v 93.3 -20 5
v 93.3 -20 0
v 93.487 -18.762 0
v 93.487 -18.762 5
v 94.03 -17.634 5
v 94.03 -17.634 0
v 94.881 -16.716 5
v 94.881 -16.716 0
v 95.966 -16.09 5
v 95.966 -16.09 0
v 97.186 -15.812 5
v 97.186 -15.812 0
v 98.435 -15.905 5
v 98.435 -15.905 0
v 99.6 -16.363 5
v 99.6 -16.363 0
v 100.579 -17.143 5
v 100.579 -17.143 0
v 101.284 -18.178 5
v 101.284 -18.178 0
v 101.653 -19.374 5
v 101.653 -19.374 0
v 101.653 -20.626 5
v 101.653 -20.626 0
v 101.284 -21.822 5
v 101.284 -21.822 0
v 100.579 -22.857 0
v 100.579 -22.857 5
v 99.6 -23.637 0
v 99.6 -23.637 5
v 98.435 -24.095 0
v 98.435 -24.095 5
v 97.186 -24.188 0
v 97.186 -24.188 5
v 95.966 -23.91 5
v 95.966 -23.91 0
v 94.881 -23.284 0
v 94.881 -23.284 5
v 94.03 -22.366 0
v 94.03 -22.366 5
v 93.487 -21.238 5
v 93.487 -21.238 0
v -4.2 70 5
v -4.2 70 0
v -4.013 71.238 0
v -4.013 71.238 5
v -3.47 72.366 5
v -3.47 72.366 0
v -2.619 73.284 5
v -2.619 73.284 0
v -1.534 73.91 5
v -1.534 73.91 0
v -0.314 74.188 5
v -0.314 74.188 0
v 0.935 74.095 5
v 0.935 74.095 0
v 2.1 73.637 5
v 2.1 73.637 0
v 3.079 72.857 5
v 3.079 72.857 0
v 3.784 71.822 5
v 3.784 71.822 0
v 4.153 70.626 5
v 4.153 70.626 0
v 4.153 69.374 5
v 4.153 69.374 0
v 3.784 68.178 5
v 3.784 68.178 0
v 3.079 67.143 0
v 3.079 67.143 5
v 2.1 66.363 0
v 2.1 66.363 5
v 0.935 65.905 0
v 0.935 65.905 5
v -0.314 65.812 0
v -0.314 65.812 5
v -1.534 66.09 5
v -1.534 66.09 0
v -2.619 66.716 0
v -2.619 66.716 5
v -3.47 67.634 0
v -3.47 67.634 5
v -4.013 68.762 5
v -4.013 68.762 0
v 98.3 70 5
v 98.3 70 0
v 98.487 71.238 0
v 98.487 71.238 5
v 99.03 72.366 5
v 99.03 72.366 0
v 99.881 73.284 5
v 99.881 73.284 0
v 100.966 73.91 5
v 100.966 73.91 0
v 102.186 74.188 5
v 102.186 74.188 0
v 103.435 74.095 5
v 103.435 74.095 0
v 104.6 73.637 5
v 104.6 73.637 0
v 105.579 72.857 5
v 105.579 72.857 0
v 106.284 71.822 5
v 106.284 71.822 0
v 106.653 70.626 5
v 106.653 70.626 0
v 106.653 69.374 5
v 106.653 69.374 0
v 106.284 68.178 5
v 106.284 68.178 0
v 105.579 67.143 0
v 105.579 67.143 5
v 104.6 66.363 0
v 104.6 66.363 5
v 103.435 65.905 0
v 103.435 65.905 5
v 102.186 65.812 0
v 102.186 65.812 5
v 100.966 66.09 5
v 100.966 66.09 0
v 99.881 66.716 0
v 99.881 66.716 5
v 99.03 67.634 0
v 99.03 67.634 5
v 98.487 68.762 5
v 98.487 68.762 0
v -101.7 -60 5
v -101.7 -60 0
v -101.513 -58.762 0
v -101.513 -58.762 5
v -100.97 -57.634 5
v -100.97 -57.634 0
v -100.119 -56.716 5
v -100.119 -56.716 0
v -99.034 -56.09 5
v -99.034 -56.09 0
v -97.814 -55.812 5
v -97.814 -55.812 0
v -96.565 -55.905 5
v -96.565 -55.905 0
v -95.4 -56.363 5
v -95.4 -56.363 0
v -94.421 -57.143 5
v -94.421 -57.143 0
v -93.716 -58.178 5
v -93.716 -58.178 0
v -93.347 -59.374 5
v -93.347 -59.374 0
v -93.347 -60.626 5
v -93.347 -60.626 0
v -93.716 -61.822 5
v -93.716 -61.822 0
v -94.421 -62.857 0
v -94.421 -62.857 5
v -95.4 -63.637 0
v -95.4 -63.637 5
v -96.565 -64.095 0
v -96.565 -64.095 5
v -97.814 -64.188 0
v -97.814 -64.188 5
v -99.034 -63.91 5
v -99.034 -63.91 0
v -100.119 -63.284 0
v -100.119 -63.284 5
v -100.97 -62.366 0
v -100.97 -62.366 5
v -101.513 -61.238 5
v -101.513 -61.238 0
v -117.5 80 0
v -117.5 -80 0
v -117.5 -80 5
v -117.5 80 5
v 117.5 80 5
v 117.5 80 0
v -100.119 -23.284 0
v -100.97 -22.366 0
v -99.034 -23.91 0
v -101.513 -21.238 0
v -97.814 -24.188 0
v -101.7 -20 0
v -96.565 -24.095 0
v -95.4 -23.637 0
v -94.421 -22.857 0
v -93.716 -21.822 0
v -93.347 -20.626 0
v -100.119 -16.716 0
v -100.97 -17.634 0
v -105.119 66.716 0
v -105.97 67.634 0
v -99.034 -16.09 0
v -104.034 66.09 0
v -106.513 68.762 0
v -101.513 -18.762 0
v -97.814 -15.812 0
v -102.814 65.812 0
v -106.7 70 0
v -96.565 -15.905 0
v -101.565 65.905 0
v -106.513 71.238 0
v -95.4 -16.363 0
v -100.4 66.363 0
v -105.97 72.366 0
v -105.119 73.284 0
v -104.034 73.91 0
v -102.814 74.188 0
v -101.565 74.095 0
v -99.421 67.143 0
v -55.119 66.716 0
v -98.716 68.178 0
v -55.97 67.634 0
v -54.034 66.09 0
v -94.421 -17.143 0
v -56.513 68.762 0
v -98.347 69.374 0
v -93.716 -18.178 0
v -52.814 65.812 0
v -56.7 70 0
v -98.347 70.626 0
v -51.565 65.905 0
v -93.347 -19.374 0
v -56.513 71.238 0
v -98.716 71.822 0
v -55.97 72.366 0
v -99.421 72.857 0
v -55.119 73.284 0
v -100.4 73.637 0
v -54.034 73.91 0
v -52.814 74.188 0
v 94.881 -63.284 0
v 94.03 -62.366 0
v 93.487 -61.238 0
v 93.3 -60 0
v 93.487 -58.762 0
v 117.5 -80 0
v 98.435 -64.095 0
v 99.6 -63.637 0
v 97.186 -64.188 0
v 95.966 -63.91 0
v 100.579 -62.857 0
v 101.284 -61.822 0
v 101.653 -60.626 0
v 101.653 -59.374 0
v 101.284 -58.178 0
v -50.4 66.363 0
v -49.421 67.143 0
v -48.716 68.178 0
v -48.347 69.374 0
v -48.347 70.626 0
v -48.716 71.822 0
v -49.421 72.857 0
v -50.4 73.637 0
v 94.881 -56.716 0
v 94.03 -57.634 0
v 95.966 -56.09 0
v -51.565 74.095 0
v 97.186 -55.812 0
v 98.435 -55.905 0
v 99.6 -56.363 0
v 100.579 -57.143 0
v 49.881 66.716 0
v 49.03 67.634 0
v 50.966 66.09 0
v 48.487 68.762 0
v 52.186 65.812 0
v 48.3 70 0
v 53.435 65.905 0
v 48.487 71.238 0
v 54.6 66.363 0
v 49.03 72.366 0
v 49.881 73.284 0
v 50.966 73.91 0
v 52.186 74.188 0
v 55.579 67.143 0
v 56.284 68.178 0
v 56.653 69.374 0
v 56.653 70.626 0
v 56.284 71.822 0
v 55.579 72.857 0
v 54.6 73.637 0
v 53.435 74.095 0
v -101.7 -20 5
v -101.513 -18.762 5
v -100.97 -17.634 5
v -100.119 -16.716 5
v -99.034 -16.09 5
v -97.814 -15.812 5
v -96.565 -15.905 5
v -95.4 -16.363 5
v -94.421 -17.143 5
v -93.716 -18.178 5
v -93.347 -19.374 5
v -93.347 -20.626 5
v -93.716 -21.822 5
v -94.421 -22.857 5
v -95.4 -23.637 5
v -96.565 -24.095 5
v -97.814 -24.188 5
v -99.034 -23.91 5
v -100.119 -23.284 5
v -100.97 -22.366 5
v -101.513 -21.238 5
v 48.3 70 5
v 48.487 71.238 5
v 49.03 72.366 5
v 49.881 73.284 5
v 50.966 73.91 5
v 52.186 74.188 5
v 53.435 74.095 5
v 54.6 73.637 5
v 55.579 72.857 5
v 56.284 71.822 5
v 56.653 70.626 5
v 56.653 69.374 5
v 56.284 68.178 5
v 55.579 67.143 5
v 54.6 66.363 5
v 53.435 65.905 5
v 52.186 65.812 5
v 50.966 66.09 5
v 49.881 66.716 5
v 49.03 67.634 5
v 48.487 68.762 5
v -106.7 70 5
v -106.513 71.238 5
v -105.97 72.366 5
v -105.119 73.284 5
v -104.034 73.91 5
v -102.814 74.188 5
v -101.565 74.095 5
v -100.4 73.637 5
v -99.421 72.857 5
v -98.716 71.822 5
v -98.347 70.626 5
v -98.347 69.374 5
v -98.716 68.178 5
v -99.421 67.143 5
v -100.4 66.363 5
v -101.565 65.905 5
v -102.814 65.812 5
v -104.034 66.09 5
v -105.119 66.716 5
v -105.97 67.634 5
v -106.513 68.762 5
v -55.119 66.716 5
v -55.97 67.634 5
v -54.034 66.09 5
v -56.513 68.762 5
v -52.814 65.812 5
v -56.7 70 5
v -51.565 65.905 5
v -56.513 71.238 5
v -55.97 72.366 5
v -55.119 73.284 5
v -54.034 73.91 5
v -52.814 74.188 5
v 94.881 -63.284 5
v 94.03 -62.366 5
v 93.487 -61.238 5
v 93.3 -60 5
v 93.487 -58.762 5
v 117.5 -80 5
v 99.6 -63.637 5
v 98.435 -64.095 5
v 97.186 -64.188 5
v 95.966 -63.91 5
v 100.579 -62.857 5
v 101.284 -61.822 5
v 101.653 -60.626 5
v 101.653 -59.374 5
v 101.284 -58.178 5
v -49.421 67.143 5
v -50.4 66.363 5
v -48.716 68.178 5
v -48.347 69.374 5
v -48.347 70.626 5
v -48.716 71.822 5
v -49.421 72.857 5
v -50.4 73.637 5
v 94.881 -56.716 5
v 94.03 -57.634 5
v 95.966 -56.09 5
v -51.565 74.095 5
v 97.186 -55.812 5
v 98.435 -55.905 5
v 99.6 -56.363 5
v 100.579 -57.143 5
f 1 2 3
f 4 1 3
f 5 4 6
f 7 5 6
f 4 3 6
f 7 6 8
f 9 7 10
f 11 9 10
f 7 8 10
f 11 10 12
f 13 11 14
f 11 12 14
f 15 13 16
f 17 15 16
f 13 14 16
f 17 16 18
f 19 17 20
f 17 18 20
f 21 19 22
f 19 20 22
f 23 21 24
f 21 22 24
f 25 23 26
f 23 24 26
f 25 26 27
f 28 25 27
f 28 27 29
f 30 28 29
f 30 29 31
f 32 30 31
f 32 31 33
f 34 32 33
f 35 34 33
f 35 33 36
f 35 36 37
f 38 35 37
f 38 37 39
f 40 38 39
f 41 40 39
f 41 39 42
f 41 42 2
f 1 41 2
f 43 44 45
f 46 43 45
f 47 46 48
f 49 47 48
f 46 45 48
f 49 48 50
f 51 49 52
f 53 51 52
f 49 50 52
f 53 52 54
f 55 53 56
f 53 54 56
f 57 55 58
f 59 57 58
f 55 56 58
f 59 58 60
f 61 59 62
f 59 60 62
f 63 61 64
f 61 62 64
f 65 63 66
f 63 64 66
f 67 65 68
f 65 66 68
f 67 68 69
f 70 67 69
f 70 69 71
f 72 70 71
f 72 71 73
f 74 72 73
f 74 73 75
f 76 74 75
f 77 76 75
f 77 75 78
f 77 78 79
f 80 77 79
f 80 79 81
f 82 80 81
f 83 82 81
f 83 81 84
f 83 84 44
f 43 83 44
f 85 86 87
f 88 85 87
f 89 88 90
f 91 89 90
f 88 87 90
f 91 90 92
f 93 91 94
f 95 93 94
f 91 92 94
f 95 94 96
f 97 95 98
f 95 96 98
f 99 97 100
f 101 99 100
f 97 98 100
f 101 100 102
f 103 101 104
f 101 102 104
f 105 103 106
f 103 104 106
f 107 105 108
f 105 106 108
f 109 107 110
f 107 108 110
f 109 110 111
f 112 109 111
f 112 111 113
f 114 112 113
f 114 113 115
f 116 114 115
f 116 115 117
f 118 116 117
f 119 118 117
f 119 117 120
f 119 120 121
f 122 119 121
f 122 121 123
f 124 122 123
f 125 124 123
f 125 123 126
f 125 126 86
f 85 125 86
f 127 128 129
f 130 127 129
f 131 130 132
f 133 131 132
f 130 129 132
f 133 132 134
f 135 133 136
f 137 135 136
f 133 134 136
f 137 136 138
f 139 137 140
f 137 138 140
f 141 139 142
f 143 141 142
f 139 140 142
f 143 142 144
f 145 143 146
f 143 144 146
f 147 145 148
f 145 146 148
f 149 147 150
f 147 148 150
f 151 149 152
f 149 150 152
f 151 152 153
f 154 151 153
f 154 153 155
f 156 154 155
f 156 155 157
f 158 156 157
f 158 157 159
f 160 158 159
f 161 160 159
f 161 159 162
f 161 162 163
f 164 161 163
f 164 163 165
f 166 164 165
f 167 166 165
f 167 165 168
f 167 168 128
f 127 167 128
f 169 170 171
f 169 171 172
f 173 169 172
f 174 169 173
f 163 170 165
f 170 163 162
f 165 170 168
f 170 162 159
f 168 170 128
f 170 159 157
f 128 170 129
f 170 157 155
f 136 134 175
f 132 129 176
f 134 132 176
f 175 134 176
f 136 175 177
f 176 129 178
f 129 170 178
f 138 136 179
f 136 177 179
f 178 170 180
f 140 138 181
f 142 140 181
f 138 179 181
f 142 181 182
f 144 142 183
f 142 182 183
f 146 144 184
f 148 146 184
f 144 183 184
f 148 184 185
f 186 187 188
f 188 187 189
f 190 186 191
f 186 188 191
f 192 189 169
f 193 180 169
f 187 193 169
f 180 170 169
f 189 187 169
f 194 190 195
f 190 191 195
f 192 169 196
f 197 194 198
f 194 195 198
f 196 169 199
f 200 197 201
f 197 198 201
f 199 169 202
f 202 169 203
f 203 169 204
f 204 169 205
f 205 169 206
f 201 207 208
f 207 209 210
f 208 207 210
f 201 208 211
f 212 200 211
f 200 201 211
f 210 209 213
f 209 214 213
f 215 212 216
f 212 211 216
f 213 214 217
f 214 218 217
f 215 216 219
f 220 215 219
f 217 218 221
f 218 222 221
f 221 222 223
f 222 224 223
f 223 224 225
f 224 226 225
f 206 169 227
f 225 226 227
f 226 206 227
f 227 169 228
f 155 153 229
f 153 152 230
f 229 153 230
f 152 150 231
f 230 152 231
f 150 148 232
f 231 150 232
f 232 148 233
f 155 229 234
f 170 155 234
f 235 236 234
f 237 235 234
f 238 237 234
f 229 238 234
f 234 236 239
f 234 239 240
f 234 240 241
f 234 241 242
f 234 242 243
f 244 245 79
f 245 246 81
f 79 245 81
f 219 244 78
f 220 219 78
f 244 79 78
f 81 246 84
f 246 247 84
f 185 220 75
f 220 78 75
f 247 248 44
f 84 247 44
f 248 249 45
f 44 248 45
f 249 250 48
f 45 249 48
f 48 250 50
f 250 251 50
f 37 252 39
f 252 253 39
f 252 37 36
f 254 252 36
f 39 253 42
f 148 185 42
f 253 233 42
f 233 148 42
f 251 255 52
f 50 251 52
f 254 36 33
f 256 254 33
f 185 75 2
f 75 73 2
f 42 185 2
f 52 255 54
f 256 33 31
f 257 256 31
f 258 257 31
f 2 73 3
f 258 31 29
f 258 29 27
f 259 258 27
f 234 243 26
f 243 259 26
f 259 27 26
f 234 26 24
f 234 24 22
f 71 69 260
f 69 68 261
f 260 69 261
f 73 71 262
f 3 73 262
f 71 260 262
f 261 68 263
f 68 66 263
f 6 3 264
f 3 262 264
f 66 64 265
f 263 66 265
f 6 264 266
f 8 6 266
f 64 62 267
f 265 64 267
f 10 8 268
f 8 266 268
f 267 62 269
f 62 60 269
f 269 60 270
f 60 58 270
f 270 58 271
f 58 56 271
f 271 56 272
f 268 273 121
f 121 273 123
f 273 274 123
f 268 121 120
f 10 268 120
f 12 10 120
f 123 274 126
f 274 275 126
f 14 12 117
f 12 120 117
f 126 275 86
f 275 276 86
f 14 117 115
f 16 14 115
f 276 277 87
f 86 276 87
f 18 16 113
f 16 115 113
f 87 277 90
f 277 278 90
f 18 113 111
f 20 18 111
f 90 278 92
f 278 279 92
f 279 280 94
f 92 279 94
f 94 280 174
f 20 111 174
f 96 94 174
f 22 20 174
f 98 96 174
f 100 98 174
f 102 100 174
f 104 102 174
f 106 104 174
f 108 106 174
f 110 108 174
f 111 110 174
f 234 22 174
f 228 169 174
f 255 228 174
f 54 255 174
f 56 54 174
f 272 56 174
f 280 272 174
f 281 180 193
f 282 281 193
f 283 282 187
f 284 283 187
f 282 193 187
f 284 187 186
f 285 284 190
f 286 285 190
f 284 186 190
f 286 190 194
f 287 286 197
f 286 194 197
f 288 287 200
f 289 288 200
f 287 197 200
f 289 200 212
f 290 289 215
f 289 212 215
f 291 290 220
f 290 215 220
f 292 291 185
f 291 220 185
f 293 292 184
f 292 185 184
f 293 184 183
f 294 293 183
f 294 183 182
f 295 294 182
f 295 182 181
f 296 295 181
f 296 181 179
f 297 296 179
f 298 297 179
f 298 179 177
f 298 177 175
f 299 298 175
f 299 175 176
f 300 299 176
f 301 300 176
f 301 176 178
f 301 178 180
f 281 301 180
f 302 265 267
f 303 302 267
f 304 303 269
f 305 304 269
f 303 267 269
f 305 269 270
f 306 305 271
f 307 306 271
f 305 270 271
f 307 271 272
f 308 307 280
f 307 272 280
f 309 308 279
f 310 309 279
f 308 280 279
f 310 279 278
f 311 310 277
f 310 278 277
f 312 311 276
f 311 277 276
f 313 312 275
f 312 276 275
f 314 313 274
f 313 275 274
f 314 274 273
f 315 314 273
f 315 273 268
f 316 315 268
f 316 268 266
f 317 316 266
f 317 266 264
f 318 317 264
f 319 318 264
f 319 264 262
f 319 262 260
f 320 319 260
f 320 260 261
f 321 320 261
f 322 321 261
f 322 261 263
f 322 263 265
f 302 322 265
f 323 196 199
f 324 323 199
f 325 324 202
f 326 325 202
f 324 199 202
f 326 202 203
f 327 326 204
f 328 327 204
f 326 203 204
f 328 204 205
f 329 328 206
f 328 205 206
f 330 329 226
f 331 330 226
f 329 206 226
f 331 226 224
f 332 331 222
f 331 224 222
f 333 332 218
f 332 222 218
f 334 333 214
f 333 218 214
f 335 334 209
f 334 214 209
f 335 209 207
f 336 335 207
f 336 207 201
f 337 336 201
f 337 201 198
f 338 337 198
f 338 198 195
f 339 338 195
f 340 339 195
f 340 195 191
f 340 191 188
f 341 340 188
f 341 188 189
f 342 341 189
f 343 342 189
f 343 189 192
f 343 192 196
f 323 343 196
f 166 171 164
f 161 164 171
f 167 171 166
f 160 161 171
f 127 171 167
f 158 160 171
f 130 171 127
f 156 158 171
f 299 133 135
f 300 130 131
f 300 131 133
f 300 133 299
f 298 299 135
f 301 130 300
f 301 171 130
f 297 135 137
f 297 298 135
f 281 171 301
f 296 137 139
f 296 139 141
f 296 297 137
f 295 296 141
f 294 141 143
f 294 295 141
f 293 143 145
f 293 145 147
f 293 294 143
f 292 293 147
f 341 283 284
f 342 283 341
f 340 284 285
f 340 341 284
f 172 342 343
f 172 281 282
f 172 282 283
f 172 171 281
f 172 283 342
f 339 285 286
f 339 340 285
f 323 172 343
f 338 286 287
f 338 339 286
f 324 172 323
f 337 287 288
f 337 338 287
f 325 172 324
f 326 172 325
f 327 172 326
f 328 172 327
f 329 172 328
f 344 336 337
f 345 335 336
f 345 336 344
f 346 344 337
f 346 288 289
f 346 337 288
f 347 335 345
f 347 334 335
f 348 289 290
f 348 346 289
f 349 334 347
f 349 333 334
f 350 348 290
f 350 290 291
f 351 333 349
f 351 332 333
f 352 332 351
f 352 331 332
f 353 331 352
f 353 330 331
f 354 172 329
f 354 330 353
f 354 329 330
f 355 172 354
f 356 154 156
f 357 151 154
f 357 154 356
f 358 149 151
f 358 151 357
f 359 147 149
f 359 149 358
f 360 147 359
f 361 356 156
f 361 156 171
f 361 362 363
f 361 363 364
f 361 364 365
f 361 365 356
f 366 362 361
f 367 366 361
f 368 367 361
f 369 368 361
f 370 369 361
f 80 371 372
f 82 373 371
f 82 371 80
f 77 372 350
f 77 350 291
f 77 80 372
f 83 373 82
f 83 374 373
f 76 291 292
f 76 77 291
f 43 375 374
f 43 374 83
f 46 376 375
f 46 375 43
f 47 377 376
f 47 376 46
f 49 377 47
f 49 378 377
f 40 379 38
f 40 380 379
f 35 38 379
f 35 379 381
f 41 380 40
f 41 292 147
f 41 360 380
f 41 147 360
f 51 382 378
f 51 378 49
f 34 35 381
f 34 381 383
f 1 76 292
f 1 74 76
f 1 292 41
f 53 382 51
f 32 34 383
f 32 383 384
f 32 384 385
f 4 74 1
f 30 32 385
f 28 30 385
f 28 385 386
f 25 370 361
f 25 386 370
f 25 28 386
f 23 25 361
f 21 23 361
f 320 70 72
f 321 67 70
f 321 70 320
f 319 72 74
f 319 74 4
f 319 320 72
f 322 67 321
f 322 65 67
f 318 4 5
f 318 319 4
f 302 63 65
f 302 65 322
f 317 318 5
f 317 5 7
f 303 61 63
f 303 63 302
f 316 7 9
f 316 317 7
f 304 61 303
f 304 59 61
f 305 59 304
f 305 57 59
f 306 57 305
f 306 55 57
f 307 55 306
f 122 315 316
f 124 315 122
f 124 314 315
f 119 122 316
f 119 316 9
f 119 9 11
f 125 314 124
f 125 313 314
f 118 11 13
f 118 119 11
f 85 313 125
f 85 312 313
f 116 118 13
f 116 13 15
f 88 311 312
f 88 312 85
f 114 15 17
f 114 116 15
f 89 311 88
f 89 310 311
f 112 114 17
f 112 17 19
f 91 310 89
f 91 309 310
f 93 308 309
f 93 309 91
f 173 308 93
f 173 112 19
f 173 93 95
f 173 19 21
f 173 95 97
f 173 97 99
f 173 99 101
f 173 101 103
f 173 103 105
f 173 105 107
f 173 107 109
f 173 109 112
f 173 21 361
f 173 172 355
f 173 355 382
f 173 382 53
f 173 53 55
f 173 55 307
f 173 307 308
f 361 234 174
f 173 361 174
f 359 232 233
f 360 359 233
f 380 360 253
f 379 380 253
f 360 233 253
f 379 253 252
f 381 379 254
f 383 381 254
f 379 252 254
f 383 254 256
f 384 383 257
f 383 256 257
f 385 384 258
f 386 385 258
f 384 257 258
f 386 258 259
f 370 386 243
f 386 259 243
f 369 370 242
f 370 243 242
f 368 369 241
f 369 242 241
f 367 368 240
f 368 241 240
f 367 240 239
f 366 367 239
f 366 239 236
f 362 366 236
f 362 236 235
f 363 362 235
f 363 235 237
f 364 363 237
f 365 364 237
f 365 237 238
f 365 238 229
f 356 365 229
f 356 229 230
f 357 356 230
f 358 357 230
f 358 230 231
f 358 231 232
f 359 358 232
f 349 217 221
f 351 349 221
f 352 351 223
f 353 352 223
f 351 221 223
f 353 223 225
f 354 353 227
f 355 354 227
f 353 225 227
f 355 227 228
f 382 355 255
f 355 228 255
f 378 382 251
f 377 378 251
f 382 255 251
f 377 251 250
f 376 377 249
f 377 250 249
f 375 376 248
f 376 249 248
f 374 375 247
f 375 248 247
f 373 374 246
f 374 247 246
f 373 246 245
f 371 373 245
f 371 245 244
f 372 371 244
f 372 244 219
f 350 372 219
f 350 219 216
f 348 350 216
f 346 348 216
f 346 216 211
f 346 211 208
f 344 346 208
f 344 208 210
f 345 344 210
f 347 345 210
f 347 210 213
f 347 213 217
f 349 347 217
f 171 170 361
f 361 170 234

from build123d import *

# Parameters (mm, degrees)
SKETCH1_W            = 235
SKETCH1_H            = 160
BOSS_EXTRUDE1_DEPTH  = 5
M8_CLEARANCE_HOLE1_D = 8.4


with BuildPart() as part:
    # Sketch1 → Boss-Extrude1 (new body)
    with BuildSketch(Plane.XY):
        Rectangle(SKETCH1_W, SKETCH1_H)
    extrude(amount=BOSS_EXTRUDE1_DEPTH)

    # M8 Clearance Hole1 (through all)
    with Locations(Plane.XY.offset(5)):
        with Locations((-102.5, 70), (-97.5, -20), (-97.5, -60), (-52.5, 70), (0, 70), (52.5, 70), (102.5, 70), (97.5, -20), (97.5, -60)):
            Hole(M8_CLEARANCE_HOLE1_D / 2)


solid = part.part
